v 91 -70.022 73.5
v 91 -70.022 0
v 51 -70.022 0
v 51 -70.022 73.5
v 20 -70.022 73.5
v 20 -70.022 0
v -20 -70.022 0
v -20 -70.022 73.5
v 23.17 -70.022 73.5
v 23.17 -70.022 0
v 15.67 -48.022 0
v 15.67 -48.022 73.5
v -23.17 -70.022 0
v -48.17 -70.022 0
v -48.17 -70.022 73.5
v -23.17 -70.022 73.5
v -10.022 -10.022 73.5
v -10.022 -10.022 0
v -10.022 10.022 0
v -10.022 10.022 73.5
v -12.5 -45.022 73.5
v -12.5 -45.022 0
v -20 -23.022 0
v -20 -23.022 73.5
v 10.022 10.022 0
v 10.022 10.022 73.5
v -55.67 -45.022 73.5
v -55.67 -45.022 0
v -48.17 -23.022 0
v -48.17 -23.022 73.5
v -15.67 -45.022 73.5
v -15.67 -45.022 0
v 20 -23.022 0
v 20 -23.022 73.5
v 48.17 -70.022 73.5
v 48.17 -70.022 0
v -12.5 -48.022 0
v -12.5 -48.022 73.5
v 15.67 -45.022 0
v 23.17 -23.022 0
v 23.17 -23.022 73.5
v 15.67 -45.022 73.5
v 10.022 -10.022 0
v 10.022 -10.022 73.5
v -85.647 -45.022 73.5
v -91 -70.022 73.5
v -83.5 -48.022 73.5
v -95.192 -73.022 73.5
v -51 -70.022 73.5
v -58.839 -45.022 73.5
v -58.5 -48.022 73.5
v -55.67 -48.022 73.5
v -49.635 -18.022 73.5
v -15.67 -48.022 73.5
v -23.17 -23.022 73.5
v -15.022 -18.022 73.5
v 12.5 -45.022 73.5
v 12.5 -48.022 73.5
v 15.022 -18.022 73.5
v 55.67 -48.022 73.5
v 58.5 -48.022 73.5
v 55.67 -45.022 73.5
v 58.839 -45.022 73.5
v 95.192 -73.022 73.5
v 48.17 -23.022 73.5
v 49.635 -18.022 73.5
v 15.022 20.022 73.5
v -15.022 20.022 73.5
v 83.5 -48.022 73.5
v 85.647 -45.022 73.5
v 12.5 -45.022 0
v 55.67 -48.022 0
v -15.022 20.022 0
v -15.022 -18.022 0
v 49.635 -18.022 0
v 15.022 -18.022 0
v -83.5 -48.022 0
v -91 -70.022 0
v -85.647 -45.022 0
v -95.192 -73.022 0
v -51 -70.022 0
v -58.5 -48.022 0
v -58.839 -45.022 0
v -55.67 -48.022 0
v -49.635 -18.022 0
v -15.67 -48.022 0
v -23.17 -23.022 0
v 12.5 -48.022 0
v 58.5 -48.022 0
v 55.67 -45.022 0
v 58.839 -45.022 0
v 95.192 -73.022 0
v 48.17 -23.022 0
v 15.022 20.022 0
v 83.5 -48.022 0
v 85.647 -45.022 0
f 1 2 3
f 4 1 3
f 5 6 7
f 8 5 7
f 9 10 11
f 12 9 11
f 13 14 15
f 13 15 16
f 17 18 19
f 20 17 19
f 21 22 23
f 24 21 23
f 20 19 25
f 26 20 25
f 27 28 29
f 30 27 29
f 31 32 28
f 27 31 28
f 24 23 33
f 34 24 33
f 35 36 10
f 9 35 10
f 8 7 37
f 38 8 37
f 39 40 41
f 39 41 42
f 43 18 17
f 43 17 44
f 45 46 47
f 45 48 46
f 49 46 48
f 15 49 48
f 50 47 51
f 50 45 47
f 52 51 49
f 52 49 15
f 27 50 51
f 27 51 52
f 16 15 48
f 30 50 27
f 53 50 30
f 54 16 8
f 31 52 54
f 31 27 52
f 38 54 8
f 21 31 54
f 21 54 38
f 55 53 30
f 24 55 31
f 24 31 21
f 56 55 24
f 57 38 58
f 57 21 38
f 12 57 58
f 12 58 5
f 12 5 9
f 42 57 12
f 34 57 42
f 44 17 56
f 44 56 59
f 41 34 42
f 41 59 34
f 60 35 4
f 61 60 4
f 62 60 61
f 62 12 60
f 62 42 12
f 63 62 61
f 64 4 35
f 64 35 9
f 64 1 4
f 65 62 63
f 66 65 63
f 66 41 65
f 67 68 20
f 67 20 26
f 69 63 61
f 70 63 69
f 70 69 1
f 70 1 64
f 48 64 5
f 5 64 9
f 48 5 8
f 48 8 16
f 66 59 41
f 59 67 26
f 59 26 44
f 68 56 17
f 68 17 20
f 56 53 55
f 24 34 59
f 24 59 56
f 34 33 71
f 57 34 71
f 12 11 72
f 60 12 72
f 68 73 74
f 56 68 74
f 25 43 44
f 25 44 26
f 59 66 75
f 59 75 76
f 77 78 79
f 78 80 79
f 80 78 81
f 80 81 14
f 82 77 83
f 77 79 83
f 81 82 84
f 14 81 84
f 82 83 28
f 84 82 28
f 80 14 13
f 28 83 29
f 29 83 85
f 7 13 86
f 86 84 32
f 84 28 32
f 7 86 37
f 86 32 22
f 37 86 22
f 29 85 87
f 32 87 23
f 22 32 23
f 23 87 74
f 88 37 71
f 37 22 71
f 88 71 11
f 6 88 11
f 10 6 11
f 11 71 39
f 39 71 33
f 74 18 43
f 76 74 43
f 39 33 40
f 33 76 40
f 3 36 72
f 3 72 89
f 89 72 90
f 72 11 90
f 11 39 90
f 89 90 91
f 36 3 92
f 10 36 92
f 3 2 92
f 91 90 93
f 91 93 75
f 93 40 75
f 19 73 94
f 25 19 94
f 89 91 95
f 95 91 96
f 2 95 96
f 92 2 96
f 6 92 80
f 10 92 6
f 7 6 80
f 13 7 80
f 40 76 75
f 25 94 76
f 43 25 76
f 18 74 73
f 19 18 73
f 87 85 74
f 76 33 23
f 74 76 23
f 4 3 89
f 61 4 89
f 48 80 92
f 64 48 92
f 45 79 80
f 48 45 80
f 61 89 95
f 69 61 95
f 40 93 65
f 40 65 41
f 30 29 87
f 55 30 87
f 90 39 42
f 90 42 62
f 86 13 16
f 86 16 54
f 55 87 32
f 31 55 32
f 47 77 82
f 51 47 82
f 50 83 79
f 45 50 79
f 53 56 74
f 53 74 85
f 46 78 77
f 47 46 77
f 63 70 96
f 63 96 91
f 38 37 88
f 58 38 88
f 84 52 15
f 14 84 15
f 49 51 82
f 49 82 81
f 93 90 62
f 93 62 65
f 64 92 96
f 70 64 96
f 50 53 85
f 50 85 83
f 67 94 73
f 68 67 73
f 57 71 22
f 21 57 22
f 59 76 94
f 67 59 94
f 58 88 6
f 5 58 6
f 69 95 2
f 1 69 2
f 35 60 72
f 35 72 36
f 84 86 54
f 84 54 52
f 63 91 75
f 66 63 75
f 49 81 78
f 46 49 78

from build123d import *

# Parameters (mm, degrees)
SKETCH1_W           = 20.045
SKETCH1_H           = 20.045
BOSS_EXTRUDE1_DEPTH = 73.5


with BuildPart() as part:
    # Sketch1 → Boss-Extrude1 (new body)
    with BuildSketch(Plane.XY):
        Polygon((-95.192265263, -73.0225), (95.192265263, -73.0225), (85.646810718, -45.0225), (58.839075981, -45.0225), (49.634530527, -18.0225), (15.0225, -18.0225), (15.0225, 20.0225), (-15.0225, 20.0225), (-15.0225, -18.0225), (-49.634530527, -18.0225), (-58.839075981, -45.0225), (-85.646810718, -45.0225), align=None)
        Rectangle(SKETCH1_W, SKETCH1_H, mode=Mode.SUBTRACT)
        Polygon((-20, -23.0225), (20, -23.0225), (12.5, -45.0225), (-12.5, -45.0225), align=None, mode=Mode.SUBTRACT)
        Polygon((23.169537991, -23.0225), (15.669537991, -45.0225), (55.669537991, -45.0225), (48.169537991, -23.0225), align=None, mode=Mode.SUBTRACT)
        Polygon((-55.669537991, -45.0225), (-48.169537991, -23.0225), (-23.169537991, -23.0225), (-15.669537991, -45.0225), align=None, mode=Mode.SUBTRACT)
        Polygon((55.669537991, -48.0225), (48.169537991, -70.0225), (23.169537991, -70.0225), (15.669537991, -48.0225), align=None, mode=Mode.SUBTRACT)
        Polygon((-20, -70.0225), (-12.5, -48.0225), (12.5, -48.0225), (20, -70.0225), align=None, mode=Mode.SUBTRACT)
        Polygon((-15.669537991, -48.0225), (-55.669537991, -48.0225), (-48.169537991, -70.0225), (-23.169537991, -70.0225), align=None, mode=Mode.SUBTRACT)
        Polygon((51, -70.0225), (58.5, -48.0225), (83.5, -48.0225), (91, -70.0225), align=None, mode=Mode.SUBTRACT)
        Polygon((-91, -70.0225), (-83.5, -48.0225), (-58.5, -48.0225), (-51, -70.0225), align=None, mode=Mode.SUBTRACT)
    extrude(amount=BOSS_EXTRUDE1_DEPTH)


solid = part.part
